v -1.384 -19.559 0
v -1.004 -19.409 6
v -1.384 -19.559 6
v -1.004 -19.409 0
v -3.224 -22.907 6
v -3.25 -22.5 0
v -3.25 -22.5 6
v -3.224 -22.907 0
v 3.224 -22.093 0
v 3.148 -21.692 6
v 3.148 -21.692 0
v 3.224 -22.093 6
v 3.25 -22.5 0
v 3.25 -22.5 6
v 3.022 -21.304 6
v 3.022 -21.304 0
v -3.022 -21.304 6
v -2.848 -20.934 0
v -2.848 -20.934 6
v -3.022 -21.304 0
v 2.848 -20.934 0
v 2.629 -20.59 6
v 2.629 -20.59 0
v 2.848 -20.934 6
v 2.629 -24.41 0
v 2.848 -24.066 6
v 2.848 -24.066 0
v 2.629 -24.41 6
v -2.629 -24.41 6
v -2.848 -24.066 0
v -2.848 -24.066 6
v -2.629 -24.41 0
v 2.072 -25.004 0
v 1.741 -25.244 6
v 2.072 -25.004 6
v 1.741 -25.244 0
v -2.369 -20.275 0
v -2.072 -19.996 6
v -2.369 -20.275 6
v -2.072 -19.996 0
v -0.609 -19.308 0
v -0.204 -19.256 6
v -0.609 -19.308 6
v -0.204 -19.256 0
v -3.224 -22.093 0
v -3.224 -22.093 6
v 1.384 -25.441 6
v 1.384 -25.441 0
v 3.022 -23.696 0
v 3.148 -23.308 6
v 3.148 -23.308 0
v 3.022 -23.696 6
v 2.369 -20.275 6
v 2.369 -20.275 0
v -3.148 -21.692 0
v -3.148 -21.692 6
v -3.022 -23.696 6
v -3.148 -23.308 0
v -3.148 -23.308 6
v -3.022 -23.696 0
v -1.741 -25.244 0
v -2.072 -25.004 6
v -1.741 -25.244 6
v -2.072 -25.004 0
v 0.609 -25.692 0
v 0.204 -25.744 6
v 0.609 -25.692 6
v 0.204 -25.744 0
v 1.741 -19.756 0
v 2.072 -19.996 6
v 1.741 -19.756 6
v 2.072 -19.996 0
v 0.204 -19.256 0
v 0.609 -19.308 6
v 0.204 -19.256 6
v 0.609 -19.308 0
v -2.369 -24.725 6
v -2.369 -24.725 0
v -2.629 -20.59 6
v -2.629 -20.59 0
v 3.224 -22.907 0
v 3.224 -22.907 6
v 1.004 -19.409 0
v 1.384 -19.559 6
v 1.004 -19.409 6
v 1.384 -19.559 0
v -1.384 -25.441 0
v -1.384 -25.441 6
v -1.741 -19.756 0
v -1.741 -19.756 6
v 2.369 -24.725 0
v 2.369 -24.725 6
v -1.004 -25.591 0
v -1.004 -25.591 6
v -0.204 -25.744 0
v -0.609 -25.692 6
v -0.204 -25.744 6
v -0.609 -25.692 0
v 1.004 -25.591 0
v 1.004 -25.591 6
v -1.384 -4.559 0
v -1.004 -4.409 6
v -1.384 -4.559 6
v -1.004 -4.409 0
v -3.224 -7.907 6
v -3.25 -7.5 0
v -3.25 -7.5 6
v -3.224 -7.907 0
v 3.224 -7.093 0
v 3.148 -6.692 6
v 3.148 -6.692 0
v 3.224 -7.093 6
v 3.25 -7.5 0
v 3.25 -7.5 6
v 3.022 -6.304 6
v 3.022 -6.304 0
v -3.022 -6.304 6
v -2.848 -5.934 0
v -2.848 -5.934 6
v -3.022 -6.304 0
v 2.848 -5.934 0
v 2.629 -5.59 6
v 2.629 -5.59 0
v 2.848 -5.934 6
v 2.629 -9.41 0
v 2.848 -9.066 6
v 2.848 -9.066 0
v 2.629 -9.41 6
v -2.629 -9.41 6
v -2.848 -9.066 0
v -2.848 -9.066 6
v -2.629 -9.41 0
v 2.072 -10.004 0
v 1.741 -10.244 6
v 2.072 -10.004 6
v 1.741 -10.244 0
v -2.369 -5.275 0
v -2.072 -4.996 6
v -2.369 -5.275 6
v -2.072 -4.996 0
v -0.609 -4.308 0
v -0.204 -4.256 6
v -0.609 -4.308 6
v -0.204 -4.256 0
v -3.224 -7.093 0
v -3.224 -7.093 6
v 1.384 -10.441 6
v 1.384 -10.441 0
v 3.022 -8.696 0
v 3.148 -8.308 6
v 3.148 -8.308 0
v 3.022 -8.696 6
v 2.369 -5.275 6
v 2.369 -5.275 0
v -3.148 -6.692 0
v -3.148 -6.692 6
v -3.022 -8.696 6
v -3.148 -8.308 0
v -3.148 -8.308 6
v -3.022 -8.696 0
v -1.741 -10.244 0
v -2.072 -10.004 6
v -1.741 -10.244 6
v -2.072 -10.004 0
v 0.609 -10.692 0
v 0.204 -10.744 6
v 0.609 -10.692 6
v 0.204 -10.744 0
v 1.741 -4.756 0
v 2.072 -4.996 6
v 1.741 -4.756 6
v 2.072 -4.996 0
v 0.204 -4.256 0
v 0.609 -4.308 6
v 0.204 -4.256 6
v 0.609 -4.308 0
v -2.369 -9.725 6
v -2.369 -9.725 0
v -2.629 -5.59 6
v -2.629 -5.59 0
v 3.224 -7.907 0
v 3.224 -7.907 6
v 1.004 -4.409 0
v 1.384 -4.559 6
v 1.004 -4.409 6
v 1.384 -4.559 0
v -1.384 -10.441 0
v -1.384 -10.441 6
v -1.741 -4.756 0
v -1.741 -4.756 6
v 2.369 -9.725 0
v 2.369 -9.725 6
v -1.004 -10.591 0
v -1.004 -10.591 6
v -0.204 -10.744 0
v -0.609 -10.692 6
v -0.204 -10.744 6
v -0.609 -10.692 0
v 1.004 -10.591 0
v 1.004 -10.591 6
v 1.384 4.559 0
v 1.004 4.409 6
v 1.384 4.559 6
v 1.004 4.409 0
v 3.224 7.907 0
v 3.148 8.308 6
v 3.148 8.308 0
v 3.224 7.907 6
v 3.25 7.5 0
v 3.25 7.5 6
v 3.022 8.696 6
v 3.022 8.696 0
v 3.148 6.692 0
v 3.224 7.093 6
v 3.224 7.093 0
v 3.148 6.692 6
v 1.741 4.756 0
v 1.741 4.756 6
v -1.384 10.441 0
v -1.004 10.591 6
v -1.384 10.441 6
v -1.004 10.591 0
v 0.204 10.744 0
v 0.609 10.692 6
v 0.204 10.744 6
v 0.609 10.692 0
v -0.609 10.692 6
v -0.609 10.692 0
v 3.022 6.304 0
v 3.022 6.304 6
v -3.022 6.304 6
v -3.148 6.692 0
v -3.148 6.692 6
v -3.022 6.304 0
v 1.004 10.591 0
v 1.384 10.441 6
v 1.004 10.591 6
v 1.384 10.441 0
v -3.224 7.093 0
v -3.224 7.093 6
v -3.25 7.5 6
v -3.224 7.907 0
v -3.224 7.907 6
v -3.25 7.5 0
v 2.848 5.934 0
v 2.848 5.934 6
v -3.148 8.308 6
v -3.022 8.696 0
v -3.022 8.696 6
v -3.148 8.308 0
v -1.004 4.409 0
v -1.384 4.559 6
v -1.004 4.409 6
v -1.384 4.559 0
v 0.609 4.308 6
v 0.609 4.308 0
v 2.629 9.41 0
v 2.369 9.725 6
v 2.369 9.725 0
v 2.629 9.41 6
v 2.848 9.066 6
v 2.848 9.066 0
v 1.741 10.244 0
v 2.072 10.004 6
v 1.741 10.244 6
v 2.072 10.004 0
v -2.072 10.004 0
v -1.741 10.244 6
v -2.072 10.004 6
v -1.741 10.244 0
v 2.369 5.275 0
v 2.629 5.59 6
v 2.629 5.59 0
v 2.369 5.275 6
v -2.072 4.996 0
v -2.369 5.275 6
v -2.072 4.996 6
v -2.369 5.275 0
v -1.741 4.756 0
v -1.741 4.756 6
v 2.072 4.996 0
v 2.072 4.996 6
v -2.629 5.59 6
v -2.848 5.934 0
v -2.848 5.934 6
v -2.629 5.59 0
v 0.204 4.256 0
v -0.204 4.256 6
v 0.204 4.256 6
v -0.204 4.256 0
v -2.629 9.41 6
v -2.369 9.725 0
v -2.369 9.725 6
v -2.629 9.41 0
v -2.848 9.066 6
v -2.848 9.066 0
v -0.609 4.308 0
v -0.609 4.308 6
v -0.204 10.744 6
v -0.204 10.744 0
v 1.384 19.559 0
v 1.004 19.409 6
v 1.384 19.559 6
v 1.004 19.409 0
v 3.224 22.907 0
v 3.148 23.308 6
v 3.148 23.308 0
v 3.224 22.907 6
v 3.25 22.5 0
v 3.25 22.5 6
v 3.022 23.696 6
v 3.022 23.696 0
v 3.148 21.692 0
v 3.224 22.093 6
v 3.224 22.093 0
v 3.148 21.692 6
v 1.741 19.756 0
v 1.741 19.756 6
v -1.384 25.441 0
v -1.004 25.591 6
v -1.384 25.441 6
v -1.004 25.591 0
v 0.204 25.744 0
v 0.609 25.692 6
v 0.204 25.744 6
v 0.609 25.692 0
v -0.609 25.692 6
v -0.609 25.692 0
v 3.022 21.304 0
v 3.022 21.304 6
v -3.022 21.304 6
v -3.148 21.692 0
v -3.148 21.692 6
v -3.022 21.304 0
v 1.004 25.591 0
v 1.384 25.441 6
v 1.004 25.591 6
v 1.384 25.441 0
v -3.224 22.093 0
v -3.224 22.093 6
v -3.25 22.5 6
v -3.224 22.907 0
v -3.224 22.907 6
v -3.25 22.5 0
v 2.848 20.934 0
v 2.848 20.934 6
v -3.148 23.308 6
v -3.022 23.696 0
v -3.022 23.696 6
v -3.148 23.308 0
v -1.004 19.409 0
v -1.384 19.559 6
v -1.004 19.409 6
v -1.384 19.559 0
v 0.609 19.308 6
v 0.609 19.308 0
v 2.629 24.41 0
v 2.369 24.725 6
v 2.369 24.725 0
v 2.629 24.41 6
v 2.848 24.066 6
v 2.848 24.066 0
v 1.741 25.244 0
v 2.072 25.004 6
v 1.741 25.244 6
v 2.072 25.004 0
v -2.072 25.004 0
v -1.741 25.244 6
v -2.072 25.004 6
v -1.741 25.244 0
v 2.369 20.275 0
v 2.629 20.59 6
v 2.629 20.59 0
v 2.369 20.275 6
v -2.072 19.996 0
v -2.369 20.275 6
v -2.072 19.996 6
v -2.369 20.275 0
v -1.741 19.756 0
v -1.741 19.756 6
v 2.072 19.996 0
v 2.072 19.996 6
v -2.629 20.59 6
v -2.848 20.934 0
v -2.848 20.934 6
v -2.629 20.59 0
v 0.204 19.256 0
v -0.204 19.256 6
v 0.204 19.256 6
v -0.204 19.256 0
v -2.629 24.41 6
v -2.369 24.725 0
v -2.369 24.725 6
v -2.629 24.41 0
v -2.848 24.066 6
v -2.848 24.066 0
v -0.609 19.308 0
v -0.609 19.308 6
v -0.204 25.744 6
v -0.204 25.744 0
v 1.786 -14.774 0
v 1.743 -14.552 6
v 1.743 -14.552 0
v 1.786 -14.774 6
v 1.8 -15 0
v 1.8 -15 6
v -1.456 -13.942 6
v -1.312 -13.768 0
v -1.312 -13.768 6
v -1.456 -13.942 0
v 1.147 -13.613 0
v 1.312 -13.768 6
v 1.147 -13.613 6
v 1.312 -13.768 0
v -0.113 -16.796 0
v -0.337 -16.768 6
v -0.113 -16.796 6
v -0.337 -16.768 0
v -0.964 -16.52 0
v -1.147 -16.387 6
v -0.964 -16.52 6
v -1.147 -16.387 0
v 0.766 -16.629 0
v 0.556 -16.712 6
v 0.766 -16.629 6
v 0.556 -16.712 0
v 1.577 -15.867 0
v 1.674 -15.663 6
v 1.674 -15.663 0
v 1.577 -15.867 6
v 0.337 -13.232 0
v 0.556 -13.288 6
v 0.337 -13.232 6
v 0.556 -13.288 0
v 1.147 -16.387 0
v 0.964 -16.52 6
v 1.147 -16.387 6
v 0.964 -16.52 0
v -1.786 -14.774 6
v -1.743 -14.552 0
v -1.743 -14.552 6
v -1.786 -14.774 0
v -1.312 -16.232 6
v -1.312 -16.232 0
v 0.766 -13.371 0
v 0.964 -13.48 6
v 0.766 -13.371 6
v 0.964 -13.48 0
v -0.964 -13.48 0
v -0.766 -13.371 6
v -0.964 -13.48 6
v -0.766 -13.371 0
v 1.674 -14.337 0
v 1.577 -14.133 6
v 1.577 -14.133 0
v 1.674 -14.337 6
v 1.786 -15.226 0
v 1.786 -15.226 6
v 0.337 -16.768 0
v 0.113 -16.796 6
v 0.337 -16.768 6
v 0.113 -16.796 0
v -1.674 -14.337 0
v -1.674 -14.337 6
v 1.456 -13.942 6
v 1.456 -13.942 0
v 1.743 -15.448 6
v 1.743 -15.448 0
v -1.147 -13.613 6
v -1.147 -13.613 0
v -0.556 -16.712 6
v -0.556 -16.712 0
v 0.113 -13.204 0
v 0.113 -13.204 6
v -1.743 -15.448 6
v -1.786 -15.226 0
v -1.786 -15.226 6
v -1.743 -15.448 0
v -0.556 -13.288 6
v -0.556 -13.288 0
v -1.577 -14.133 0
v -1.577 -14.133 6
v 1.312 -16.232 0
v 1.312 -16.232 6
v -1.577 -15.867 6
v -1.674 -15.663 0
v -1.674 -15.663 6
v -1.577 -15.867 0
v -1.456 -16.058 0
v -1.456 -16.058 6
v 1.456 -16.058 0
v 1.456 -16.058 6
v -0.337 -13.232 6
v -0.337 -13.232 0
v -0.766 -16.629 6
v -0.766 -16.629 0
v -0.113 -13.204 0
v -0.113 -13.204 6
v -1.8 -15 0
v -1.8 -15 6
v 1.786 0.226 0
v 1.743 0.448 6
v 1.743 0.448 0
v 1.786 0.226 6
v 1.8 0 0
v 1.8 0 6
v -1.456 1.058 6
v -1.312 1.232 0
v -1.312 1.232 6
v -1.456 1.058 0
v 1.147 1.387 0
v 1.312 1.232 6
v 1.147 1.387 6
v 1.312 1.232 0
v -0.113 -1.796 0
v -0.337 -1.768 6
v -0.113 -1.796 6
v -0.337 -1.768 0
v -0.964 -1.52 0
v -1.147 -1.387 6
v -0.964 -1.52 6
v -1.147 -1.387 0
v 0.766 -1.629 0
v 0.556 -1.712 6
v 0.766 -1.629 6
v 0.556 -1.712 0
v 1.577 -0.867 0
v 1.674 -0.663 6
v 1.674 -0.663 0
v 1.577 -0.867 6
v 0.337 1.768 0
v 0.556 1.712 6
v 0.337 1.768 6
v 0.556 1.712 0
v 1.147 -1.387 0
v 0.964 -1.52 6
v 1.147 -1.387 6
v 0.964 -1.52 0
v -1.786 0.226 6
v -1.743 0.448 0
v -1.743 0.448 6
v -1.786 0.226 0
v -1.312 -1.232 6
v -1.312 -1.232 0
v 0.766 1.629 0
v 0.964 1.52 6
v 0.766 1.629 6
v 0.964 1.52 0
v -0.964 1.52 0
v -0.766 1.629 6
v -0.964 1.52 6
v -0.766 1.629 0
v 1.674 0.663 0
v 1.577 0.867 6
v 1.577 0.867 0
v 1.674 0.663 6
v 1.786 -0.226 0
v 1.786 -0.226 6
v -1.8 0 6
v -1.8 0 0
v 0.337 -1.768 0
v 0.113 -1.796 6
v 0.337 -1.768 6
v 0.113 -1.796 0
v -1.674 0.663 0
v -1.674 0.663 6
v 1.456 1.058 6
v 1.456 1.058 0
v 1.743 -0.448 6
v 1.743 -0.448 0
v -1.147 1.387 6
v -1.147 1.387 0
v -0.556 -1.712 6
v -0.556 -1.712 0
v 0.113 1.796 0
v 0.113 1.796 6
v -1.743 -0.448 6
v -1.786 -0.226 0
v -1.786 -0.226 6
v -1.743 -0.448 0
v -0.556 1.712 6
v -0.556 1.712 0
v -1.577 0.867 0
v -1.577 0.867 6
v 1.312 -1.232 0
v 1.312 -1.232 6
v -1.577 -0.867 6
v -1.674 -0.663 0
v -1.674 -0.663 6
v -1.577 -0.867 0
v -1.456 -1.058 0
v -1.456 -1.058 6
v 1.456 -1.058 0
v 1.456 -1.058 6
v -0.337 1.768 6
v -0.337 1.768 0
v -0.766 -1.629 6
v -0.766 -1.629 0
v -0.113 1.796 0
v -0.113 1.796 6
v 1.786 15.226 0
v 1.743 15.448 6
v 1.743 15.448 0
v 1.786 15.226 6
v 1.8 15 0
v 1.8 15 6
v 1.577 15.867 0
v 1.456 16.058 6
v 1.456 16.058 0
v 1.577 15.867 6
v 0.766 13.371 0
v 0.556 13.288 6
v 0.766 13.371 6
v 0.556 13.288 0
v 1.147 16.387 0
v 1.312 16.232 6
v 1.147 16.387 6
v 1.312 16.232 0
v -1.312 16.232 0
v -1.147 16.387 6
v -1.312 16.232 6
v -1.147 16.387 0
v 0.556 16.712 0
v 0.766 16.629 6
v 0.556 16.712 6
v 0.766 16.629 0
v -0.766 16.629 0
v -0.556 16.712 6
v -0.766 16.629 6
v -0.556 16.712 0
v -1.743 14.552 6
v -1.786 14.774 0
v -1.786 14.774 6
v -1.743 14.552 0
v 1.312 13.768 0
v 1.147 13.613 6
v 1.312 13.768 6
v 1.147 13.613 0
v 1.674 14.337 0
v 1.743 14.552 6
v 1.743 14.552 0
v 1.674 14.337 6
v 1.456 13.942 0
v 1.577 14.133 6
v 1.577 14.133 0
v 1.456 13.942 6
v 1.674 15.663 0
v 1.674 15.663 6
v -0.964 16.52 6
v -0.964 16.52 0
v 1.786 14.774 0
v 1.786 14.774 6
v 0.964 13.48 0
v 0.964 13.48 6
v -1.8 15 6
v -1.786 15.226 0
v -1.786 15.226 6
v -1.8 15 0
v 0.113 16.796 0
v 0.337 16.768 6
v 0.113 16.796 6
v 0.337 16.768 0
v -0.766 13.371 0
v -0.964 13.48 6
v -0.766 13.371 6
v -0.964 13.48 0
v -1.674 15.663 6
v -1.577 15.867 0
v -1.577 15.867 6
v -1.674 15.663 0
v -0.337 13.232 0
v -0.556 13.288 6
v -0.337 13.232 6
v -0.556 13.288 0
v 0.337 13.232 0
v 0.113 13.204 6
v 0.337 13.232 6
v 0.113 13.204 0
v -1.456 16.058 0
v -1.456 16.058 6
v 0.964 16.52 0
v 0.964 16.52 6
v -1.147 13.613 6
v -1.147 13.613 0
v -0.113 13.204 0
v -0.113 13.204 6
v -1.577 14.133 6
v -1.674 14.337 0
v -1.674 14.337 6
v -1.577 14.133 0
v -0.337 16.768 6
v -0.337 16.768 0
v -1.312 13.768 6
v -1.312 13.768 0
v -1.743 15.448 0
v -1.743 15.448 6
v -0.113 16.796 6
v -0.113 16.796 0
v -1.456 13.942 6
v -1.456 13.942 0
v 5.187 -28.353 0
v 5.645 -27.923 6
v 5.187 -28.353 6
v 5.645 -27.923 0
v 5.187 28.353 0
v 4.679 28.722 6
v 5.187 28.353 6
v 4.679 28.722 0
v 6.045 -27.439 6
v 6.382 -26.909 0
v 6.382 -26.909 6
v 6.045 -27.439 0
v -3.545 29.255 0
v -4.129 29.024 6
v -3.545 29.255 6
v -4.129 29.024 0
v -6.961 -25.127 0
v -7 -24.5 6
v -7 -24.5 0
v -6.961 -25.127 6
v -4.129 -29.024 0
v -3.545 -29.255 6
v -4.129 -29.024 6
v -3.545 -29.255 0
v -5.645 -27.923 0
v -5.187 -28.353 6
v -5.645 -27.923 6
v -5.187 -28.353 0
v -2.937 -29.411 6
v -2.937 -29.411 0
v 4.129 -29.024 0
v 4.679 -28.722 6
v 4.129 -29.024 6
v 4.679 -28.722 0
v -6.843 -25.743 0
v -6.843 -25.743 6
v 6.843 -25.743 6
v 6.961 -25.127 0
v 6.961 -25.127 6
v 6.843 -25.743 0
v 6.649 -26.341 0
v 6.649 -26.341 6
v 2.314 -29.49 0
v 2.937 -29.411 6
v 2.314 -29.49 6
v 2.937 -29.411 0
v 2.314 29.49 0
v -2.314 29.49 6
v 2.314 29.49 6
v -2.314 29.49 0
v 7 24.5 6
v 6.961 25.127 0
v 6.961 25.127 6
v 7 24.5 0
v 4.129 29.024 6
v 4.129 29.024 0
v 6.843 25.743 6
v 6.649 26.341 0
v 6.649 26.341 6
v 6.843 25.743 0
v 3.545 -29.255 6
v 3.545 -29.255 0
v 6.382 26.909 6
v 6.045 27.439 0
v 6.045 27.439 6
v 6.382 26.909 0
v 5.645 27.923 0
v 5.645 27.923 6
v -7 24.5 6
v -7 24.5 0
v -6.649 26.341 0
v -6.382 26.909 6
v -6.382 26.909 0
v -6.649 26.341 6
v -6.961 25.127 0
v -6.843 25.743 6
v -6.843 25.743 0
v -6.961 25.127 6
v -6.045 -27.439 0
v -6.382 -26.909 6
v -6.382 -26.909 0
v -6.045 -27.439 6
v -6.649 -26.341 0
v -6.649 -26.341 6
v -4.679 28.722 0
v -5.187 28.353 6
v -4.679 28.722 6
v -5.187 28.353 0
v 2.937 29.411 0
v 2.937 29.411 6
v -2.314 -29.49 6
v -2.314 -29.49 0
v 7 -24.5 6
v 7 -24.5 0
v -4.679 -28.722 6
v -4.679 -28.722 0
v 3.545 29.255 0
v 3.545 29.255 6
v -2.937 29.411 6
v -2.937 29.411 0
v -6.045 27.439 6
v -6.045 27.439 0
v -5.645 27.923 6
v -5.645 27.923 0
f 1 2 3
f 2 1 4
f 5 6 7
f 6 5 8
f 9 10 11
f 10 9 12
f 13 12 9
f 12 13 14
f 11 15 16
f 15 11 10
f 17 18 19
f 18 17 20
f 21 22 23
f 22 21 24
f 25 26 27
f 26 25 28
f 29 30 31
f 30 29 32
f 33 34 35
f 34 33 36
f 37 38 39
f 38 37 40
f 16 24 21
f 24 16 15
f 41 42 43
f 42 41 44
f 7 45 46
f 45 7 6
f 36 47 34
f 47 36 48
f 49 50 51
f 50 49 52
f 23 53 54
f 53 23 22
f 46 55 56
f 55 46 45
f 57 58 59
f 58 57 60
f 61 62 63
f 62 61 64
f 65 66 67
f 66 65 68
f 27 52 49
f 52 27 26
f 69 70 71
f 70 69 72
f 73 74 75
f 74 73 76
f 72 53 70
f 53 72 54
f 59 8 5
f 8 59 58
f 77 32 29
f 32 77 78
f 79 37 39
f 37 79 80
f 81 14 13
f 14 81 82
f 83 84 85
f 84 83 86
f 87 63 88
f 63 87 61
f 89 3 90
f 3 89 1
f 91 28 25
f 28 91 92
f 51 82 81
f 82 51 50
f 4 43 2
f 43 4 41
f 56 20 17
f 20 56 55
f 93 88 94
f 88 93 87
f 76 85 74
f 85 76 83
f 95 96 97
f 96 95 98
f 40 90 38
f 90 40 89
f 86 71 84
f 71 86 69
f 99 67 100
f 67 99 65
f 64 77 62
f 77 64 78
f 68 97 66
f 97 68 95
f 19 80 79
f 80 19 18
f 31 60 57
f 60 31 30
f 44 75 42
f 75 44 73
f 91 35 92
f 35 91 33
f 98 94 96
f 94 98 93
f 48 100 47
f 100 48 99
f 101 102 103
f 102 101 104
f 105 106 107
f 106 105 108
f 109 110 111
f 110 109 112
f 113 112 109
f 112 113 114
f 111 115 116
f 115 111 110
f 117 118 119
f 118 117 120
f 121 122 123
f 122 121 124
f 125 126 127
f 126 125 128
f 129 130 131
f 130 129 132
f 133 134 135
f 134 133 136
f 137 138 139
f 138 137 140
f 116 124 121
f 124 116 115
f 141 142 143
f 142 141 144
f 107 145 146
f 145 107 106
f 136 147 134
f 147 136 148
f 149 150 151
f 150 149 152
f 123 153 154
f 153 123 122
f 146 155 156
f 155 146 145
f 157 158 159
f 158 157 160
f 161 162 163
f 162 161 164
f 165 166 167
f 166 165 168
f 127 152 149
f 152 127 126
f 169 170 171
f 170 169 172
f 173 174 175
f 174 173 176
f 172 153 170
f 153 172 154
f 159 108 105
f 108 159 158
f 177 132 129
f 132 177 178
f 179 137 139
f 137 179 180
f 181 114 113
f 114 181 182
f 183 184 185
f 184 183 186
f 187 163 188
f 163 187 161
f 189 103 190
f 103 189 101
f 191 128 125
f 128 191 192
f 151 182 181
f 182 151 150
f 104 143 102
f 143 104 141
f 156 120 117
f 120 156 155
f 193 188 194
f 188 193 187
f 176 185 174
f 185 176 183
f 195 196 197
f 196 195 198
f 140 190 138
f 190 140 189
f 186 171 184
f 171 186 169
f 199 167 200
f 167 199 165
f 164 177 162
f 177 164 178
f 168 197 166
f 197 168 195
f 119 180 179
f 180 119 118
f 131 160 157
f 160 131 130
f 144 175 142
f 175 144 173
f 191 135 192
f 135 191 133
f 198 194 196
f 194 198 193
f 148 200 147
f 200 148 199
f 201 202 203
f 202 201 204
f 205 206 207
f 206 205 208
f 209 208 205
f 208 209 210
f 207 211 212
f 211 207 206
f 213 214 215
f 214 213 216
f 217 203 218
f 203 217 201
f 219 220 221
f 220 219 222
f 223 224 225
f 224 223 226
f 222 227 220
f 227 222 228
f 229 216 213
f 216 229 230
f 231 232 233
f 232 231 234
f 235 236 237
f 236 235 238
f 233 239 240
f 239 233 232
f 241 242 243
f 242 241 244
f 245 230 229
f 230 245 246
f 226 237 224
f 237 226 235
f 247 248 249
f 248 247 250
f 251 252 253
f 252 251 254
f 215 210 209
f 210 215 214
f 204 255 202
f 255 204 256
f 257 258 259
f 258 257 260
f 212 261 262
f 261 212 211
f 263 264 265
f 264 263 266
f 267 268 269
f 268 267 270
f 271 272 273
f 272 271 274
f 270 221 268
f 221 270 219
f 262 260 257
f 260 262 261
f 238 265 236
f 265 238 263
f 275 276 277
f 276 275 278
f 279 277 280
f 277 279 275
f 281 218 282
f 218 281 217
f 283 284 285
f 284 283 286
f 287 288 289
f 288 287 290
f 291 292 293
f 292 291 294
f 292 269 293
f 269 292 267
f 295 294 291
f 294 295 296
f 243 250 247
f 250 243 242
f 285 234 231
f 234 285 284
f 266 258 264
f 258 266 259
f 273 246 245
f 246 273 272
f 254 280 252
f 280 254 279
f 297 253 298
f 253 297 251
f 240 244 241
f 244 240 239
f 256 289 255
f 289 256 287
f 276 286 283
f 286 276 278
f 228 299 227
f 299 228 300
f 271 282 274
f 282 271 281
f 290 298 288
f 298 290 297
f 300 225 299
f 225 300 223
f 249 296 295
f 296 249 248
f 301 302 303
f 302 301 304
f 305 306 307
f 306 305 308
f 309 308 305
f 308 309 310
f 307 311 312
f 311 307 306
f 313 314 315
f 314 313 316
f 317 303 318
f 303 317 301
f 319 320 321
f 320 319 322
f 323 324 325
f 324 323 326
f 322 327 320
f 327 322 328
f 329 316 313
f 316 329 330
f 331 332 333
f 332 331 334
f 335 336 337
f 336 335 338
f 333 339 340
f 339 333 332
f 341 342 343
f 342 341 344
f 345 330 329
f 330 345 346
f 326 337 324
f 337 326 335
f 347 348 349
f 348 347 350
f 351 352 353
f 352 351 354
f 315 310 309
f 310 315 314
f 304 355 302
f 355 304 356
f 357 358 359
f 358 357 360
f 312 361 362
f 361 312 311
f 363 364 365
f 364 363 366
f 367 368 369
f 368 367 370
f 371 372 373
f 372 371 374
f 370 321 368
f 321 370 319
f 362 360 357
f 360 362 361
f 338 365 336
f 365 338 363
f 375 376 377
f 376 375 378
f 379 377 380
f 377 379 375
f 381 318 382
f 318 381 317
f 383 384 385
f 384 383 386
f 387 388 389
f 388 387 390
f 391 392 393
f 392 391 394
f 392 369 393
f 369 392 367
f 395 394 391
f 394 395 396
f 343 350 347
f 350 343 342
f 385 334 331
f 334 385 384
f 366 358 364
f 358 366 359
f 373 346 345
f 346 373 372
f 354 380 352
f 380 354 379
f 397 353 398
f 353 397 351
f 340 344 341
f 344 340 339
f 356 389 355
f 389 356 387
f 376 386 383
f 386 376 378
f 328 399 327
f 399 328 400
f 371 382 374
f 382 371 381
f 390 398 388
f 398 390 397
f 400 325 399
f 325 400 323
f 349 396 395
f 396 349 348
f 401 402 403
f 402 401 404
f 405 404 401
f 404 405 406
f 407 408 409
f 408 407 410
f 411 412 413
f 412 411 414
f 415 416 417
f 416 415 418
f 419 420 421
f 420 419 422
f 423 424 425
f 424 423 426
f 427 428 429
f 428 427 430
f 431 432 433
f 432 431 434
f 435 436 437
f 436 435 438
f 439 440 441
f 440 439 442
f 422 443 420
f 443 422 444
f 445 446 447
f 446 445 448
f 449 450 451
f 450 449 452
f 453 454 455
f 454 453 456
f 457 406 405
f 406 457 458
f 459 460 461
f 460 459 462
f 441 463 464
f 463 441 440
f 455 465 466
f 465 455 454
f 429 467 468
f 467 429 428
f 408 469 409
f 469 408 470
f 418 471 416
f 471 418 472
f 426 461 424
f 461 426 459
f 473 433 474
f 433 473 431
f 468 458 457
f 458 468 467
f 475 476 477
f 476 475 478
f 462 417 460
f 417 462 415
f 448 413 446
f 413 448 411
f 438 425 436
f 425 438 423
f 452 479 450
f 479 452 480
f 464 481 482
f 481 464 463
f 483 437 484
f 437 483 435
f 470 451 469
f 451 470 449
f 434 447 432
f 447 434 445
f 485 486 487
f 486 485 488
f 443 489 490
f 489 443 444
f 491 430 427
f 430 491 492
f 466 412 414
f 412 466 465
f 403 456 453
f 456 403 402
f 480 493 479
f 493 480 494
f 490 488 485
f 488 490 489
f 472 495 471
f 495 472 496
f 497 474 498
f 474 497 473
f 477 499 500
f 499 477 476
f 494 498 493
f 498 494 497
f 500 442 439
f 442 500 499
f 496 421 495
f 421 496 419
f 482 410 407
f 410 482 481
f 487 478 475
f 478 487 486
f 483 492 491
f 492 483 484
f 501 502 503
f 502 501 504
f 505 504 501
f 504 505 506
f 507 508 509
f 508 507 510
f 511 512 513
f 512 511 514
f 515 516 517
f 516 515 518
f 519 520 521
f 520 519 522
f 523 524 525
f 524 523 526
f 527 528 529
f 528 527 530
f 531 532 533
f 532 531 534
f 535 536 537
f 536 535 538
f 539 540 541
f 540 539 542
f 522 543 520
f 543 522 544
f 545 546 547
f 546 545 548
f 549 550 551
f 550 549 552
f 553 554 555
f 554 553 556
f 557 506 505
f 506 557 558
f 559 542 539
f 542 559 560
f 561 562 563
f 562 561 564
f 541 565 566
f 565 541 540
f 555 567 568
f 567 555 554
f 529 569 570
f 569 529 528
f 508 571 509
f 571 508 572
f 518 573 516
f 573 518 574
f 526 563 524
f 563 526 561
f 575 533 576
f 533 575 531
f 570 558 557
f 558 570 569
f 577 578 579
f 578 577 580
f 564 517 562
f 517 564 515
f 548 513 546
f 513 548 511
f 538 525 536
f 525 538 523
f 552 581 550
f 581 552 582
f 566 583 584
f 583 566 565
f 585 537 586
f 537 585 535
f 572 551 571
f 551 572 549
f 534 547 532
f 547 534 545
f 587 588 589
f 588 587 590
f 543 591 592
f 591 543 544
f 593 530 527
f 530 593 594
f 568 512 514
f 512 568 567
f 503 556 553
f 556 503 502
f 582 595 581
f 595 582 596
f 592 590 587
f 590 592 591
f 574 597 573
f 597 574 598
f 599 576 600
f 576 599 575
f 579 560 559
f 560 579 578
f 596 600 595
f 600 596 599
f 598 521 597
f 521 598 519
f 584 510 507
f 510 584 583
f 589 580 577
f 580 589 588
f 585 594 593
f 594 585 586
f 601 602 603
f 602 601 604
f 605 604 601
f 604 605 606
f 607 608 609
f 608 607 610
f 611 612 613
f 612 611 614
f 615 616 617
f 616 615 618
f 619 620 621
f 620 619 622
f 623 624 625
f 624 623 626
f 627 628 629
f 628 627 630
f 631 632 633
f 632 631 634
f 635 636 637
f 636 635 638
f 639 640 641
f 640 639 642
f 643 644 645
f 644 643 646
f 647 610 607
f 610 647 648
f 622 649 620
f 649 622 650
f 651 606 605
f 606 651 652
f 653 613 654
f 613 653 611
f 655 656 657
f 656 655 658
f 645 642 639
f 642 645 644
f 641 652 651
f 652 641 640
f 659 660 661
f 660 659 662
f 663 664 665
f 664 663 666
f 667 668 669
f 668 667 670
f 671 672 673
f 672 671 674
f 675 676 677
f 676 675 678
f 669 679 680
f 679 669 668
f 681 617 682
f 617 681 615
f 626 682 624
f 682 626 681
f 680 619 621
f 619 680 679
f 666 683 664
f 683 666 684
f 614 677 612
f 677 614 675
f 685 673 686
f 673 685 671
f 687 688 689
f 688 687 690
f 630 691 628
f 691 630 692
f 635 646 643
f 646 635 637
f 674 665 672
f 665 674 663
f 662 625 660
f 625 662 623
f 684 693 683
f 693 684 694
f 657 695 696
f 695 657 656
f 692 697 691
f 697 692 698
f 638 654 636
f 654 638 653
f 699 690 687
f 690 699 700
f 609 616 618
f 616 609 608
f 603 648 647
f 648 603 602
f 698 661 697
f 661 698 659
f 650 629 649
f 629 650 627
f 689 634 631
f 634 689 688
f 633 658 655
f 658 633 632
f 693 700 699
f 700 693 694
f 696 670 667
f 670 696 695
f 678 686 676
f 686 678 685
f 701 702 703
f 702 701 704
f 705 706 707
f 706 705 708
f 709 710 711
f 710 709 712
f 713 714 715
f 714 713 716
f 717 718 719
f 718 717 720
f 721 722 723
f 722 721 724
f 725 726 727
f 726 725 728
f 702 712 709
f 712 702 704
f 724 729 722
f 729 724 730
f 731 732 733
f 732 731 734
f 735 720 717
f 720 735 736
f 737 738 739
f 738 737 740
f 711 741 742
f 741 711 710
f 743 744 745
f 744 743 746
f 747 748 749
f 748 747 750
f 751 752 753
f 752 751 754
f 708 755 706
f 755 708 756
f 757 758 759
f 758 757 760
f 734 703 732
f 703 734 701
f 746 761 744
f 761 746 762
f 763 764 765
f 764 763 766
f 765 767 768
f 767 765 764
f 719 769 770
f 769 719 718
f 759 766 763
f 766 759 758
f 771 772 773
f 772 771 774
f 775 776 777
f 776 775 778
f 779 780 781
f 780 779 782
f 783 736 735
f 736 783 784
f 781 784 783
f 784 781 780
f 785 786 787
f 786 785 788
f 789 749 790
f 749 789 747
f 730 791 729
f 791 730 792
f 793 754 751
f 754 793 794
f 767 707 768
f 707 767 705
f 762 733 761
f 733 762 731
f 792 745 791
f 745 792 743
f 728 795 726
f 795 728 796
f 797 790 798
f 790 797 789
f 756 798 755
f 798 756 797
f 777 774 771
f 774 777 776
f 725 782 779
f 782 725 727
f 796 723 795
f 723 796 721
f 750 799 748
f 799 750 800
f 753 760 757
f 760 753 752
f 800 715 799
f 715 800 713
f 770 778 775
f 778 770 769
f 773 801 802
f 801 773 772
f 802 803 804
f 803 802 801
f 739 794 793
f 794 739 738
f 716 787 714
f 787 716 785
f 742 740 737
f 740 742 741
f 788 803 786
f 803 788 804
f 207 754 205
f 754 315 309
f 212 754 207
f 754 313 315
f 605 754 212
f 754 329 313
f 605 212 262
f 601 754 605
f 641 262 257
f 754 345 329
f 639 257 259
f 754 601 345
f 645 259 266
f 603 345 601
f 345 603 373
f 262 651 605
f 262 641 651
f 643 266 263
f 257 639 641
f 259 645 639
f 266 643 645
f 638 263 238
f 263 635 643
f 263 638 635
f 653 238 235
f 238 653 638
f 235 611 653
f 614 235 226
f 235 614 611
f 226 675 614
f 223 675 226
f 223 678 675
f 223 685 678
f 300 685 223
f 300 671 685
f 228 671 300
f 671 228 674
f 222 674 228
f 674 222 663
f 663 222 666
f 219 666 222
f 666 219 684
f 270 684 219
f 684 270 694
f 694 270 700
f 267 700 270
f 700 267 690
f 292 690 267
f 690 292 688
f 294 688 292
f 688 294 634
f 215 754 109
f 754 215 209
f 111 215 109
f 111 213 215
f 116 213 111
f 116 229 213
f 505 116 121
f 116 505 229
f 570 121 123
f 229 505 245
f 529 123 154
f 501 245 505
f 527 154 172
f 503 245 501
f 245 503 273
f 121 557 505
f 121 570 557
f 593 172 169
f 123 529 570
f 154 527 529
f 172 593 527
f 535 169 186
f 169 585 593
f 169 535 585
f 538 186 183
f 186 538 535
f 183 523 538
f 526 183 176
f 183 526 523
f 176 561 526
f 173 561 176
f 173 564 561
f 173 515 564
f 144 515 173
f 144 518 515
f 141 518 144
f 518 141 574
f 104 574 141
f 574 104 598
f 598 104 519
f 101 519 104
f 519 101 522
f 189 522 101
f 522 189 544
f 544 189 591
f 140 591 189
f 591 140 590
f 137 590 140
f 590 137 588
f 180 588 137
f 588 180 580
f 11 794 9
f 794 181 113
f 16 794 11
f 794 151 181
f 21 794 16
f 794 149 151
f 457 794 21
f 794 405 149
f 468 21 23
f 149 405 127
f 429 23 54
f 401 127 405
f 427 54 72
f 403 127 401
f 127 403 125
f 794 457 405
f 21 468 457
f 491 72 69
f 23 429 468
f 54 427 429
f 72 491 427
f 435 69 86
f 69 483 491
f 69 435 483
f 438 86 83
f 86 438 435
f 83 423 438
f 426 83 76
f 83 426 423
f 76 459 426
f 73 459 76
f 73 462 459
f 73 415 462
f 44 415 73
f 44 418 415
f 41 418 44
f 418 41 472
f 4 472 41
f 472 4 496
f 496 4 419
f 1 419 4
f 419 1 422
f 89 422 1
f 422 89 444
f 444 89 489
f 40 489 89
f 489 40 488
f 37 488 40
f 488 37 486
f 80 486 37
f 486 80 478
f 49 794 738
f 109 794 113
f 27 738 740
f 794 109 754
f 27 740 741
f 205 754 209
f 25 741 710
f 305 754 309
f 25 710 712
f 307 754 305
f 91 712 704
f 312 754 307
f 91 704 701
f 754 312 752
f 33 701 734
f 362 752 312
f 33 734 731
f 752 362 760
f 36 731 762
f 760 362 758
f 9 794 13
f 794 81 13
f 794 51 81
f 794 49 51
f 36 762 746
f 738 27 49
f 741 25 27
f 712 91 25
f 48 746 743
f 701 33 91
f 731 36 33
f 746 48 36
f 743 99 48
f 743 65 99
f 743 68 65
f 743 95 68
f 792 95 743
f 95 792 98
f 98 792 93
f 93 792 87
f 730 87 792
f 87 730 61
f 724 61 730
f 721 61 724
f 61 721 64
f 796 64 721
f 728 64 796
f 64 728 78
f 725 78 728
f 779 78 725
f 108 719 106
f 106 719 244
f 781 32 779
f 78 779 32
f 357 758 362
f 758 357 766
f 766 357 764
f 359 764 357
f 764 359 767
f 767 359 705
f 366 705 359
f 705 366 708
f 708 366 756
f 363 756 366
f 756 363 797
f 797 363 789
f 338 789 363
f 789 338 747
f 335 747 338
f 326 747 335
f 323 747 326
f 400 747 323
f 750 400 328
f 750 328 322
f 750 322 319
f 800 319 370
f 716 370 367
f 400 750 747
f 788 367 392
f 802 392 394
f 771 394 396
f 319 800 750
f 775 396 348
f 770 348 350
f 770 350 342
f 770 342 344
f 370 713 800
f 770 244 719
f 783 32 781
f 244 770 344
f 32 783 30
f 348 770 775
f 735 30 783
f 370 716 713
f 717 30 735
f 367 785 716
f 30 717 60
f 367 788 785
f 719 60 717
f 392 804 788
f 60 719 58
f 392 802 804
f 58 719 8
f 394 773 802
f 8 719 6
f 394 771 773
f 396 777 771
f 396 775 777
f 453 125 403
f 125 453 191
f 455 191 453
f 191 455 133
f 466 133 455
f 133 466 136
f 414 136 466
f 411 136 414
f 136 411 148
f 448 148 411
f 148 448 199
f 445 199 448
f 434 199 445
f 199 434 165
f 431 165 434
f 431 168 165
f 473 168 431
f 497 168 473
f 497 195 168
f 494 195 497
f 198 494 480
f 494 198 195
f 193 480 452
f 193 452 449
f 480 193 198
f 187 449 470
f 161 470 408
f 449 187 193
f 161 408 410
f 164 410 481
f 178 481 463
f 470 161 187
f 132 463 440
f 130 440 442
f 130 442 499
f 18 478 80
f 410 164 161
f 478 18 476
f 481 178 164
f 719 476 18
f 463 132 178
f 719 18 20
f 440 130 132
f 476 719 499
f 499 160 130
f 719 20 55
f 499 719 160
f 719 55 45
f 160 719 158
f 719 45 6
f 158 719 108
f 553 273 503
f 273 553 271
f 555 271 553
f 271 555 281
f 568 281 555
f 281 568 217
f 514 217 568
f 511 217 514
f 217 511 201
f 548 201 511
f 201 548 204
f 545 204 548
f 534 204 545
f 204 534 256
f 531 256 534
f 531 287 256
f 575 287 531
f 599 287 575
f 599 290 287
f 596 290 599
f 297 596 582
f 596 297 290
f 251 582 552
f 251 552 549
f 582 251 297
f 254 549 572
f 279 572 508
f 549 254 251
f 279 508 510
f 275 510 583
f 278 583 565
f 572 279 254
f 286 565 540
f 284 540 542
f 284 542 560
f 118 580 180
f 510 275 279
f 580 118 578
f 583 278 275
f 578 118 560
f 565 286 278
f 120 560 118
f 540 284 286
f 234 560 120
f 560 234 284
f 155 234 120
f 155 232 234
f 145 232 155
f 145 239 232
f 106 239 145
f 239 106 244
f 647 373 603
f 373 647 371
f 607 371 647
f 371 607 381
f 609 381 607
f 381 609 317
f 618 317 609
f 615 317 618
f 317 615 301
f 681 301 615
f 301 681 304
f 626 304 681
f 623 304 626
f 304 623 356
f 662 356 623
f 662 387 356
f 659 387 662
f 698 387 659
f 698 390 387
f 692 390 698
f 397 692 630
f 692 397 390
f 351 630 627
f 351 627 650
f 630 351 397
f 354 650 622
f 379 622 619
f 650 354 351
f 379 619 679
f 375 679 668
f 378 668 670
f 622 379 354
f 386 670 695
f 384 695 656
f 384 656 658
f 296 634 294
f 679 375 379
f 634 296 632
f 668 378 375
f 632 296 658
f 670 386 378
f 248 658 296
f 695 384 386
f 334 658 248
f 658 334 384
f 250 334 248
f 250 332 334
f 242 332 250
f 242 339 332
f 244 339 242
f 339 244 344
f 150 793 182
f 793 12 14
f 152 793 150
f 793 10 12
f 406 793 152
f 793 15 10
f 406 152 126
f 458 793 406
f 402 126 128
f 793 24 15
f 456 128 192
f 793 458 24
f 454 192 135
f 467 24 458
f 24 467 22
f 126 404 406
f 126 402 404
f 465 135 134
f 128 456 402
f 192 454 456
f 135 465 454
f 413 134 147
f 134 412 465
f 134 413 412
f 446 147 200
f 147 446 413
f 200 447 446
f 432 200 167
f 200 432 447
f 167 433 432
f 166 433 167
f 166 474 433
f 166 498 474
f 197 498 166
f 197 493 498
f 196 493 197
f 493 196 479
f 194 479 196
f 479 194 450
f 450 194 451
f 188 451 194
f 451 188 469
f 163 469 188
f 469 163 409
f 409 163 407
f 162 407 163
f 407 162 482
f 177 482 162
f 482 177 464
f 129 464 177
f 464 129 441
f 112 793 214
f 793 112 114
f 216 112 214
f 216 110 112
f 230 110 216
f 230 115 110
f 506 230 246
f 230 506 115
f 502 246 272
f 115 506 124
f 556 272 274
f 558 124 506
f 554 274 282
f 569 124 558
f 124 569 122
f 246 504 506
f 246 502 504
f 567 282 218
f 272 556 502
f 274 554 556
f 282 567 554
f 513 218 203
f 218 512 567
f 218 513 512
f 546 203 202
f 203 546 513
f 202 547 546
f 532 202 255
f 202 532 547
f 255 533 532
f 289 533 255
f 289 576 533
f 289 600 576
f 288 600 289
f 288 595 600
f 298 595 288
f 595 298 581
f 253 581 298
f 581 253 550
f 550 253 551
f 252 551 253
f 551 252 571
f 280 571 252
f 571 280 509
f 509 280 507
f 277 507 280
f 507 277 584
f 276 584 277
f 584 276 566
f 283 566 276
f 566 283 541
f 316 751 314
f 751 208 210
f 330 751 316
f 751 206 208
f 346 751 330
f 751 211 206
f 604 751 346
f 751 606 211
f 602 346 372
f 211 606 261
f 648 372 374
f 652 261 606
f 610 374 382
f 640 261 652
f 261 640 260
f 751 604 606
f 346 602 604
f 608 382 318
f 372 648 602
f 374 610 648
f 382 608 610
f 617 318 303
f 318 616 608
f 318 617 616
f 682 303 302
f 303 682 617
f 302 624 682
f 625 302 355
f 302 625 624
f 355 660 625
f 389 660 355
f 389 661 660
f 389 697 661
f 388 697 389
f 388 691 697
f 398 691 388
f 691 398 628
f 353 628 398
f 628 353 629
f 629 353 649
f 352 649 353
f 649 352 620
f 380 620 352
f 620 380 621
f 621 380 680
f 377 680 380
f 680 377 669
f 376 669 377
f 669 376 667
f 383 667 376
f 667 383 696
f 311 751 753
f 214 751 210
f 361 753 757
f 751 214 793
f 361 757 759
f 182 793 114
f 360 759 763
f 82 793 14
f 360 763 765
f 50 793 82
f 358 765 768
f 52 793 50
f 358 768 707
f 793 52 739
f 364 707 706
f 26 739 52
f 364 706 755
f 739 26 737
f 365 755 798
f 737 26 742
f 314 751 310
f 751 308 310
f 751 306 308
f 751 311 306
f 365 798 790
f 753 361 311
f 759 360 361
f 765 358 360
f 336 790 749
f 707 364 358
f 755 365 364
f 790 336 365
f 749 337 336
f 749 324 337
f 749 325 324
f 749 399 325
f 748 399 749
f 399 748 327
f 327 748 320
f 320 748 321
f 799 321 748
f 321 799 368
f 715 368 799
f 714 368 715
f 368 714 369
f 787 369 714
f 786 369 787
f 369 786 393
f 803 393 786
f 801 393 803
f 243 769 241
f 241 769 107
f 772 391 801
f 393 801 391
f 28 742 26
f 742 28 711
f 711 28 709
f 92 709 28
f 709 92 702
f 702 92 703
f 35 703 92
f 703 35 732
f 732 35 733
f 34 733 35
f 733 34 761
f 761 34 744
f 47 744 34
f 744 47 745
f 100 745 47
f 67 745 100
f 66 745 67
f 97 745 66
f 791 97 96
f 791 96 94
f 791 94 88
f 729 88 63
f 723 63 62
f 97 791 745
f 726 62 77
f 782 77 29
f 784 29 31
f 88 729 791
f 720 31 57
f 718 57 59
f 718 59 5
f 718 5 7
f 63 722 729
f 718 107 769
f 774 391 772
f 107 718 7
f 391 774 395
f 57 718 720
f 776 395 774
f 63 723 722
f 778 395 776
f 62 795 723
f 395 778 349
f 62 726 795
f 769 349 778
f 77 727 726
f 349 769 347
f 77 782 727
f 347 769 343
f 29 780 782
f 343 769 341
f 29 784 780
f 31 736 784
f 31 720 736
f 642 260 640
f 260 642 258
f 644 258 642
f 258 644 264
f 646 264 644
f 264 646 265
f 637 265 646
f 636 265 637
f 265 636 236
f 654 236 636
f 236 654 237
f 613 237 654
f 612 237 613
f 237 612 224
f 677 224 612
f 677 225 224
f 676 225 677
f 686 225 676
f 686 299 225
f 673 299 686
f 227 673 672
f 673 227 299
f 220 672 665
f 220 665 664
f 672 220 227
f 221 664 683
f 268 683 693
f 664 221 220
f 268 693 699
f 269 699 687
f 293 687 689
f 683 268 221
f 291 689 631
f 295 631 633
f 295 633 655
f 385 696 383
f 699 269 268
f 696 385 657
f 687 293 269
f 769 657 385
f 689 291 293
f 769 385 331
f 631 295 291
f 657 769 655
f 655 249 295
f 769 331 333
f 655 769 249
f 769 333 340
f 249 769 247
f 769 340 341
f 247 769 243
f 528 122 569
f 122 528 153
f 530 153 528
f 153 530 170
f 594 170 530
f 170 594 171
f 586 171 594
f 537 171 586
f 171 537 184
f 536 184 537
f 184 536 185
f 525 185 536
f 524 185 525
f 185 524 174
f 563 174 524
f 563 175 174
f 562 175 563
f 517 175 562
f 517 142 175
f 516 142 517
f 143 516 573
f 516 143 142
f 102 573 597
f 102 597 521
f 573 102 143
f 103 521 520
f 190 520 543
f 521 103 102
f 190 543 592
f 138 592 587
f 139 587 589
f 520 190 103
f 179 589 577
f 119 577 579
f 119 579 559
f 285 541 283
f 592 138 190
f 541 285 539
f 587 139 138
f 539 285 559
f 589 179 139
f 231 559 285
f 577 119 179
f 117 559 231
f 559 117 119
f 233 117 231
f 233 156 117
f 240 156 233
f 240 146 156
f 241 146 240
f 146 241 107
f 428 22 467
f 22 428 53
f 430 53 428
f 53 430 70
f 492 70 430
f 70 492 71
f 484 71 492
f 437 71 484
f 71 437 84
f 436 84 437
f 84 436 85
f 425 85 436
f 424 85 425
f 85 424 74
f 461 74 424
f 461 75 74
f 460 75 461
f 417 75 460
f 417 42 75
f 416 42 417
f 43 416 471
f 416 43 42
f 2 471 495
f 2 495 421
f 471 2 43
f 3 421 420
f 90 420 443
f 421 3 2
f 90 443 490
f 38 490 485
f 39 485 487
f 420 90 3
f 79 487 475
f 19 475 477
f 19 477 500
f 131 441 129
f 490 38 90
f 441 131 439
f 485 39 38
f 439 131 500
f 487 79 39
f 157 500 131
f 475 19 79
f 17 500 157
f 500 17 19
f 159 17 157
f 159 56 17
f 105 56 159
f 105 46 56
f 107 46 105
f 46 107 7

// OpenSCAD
$fn = 50;

difference() {
	union() {
		hull() {
			translate(v = [-2.0, 24.5, 0]) {
				cylinder(h = 6, r = 5);
			}
			translate(v = [2.0, 24.5, 0]) {
				cylinder(h = 6, r = 5);
			}
			translate(v = [-2.0, -24.5, 0]) {
				cylinder(h = 6, r = 5);
			}
			translate(v = [2.0, -24.5, 0]) {
				cylinder(h = 6, r = 5);
			}
		}
	}
	union() {
		translate(v = [0.0, -22.5, 0]) {
			translate(v = [0, 0, -100]) {
				cylinder(h = 200, r = 3.25);
			}
		}
		translate(v = [0.0, -7.5, 0]) {
			translate(v = [0, 0, -100]) {
				cylinder(h = 200, r = 3.25);
			}
		}
		translate(v = [0.0, 7.5, 0]) {
			translate(v = [0, 0, -100]) {
				cylinder(h = 200, r = 3.25);
			}
		}
		translate(v = [0.0, 22.5, 0]) {
			translate(v = [0, 0, -100]) {
				cylinder(h = 200, r = 3.25);
			}
		}
		translate(v = [0.0, -22.5, 0]) {
			translate(v = [0, 0, -100]) {
				cylinder(h = 200, r = 1.8);
			}
		}
		translate(v = [0.0, -15.0, 0]) {
			translate(v = [0, 0, -100]) {
				cylinder(h = 200, r = 1.8);
			}
		}
		translate(v = [0.0, -7.5, 0]) {
			translate(v = [0, 0, -100]) {
				cylinder(h = 200, r = 1.8);
			}
		}
		translate(v = [0, 0, -100]) {
			cylinder(h = 200, r = 1.8);
		}
		translate(v = [0.0, 7.5, 0]) {
			translate(v = [0, 0, -100]) {
				cylinder(h = 200, r = 1.8);
			}
		}
		translate(v = [0.0, 15.0, 0]) {
			translate(v = [0, 0, -100]) {
				cylinder(h = 200, r = 1.8);
			}
		}
		translate(v = [0.0, 22.5, 0]) {
			translate(v = [0, 0, -100]) {
				cylinder(h = 200, r = 1.8);
			}
		}
	}
}
